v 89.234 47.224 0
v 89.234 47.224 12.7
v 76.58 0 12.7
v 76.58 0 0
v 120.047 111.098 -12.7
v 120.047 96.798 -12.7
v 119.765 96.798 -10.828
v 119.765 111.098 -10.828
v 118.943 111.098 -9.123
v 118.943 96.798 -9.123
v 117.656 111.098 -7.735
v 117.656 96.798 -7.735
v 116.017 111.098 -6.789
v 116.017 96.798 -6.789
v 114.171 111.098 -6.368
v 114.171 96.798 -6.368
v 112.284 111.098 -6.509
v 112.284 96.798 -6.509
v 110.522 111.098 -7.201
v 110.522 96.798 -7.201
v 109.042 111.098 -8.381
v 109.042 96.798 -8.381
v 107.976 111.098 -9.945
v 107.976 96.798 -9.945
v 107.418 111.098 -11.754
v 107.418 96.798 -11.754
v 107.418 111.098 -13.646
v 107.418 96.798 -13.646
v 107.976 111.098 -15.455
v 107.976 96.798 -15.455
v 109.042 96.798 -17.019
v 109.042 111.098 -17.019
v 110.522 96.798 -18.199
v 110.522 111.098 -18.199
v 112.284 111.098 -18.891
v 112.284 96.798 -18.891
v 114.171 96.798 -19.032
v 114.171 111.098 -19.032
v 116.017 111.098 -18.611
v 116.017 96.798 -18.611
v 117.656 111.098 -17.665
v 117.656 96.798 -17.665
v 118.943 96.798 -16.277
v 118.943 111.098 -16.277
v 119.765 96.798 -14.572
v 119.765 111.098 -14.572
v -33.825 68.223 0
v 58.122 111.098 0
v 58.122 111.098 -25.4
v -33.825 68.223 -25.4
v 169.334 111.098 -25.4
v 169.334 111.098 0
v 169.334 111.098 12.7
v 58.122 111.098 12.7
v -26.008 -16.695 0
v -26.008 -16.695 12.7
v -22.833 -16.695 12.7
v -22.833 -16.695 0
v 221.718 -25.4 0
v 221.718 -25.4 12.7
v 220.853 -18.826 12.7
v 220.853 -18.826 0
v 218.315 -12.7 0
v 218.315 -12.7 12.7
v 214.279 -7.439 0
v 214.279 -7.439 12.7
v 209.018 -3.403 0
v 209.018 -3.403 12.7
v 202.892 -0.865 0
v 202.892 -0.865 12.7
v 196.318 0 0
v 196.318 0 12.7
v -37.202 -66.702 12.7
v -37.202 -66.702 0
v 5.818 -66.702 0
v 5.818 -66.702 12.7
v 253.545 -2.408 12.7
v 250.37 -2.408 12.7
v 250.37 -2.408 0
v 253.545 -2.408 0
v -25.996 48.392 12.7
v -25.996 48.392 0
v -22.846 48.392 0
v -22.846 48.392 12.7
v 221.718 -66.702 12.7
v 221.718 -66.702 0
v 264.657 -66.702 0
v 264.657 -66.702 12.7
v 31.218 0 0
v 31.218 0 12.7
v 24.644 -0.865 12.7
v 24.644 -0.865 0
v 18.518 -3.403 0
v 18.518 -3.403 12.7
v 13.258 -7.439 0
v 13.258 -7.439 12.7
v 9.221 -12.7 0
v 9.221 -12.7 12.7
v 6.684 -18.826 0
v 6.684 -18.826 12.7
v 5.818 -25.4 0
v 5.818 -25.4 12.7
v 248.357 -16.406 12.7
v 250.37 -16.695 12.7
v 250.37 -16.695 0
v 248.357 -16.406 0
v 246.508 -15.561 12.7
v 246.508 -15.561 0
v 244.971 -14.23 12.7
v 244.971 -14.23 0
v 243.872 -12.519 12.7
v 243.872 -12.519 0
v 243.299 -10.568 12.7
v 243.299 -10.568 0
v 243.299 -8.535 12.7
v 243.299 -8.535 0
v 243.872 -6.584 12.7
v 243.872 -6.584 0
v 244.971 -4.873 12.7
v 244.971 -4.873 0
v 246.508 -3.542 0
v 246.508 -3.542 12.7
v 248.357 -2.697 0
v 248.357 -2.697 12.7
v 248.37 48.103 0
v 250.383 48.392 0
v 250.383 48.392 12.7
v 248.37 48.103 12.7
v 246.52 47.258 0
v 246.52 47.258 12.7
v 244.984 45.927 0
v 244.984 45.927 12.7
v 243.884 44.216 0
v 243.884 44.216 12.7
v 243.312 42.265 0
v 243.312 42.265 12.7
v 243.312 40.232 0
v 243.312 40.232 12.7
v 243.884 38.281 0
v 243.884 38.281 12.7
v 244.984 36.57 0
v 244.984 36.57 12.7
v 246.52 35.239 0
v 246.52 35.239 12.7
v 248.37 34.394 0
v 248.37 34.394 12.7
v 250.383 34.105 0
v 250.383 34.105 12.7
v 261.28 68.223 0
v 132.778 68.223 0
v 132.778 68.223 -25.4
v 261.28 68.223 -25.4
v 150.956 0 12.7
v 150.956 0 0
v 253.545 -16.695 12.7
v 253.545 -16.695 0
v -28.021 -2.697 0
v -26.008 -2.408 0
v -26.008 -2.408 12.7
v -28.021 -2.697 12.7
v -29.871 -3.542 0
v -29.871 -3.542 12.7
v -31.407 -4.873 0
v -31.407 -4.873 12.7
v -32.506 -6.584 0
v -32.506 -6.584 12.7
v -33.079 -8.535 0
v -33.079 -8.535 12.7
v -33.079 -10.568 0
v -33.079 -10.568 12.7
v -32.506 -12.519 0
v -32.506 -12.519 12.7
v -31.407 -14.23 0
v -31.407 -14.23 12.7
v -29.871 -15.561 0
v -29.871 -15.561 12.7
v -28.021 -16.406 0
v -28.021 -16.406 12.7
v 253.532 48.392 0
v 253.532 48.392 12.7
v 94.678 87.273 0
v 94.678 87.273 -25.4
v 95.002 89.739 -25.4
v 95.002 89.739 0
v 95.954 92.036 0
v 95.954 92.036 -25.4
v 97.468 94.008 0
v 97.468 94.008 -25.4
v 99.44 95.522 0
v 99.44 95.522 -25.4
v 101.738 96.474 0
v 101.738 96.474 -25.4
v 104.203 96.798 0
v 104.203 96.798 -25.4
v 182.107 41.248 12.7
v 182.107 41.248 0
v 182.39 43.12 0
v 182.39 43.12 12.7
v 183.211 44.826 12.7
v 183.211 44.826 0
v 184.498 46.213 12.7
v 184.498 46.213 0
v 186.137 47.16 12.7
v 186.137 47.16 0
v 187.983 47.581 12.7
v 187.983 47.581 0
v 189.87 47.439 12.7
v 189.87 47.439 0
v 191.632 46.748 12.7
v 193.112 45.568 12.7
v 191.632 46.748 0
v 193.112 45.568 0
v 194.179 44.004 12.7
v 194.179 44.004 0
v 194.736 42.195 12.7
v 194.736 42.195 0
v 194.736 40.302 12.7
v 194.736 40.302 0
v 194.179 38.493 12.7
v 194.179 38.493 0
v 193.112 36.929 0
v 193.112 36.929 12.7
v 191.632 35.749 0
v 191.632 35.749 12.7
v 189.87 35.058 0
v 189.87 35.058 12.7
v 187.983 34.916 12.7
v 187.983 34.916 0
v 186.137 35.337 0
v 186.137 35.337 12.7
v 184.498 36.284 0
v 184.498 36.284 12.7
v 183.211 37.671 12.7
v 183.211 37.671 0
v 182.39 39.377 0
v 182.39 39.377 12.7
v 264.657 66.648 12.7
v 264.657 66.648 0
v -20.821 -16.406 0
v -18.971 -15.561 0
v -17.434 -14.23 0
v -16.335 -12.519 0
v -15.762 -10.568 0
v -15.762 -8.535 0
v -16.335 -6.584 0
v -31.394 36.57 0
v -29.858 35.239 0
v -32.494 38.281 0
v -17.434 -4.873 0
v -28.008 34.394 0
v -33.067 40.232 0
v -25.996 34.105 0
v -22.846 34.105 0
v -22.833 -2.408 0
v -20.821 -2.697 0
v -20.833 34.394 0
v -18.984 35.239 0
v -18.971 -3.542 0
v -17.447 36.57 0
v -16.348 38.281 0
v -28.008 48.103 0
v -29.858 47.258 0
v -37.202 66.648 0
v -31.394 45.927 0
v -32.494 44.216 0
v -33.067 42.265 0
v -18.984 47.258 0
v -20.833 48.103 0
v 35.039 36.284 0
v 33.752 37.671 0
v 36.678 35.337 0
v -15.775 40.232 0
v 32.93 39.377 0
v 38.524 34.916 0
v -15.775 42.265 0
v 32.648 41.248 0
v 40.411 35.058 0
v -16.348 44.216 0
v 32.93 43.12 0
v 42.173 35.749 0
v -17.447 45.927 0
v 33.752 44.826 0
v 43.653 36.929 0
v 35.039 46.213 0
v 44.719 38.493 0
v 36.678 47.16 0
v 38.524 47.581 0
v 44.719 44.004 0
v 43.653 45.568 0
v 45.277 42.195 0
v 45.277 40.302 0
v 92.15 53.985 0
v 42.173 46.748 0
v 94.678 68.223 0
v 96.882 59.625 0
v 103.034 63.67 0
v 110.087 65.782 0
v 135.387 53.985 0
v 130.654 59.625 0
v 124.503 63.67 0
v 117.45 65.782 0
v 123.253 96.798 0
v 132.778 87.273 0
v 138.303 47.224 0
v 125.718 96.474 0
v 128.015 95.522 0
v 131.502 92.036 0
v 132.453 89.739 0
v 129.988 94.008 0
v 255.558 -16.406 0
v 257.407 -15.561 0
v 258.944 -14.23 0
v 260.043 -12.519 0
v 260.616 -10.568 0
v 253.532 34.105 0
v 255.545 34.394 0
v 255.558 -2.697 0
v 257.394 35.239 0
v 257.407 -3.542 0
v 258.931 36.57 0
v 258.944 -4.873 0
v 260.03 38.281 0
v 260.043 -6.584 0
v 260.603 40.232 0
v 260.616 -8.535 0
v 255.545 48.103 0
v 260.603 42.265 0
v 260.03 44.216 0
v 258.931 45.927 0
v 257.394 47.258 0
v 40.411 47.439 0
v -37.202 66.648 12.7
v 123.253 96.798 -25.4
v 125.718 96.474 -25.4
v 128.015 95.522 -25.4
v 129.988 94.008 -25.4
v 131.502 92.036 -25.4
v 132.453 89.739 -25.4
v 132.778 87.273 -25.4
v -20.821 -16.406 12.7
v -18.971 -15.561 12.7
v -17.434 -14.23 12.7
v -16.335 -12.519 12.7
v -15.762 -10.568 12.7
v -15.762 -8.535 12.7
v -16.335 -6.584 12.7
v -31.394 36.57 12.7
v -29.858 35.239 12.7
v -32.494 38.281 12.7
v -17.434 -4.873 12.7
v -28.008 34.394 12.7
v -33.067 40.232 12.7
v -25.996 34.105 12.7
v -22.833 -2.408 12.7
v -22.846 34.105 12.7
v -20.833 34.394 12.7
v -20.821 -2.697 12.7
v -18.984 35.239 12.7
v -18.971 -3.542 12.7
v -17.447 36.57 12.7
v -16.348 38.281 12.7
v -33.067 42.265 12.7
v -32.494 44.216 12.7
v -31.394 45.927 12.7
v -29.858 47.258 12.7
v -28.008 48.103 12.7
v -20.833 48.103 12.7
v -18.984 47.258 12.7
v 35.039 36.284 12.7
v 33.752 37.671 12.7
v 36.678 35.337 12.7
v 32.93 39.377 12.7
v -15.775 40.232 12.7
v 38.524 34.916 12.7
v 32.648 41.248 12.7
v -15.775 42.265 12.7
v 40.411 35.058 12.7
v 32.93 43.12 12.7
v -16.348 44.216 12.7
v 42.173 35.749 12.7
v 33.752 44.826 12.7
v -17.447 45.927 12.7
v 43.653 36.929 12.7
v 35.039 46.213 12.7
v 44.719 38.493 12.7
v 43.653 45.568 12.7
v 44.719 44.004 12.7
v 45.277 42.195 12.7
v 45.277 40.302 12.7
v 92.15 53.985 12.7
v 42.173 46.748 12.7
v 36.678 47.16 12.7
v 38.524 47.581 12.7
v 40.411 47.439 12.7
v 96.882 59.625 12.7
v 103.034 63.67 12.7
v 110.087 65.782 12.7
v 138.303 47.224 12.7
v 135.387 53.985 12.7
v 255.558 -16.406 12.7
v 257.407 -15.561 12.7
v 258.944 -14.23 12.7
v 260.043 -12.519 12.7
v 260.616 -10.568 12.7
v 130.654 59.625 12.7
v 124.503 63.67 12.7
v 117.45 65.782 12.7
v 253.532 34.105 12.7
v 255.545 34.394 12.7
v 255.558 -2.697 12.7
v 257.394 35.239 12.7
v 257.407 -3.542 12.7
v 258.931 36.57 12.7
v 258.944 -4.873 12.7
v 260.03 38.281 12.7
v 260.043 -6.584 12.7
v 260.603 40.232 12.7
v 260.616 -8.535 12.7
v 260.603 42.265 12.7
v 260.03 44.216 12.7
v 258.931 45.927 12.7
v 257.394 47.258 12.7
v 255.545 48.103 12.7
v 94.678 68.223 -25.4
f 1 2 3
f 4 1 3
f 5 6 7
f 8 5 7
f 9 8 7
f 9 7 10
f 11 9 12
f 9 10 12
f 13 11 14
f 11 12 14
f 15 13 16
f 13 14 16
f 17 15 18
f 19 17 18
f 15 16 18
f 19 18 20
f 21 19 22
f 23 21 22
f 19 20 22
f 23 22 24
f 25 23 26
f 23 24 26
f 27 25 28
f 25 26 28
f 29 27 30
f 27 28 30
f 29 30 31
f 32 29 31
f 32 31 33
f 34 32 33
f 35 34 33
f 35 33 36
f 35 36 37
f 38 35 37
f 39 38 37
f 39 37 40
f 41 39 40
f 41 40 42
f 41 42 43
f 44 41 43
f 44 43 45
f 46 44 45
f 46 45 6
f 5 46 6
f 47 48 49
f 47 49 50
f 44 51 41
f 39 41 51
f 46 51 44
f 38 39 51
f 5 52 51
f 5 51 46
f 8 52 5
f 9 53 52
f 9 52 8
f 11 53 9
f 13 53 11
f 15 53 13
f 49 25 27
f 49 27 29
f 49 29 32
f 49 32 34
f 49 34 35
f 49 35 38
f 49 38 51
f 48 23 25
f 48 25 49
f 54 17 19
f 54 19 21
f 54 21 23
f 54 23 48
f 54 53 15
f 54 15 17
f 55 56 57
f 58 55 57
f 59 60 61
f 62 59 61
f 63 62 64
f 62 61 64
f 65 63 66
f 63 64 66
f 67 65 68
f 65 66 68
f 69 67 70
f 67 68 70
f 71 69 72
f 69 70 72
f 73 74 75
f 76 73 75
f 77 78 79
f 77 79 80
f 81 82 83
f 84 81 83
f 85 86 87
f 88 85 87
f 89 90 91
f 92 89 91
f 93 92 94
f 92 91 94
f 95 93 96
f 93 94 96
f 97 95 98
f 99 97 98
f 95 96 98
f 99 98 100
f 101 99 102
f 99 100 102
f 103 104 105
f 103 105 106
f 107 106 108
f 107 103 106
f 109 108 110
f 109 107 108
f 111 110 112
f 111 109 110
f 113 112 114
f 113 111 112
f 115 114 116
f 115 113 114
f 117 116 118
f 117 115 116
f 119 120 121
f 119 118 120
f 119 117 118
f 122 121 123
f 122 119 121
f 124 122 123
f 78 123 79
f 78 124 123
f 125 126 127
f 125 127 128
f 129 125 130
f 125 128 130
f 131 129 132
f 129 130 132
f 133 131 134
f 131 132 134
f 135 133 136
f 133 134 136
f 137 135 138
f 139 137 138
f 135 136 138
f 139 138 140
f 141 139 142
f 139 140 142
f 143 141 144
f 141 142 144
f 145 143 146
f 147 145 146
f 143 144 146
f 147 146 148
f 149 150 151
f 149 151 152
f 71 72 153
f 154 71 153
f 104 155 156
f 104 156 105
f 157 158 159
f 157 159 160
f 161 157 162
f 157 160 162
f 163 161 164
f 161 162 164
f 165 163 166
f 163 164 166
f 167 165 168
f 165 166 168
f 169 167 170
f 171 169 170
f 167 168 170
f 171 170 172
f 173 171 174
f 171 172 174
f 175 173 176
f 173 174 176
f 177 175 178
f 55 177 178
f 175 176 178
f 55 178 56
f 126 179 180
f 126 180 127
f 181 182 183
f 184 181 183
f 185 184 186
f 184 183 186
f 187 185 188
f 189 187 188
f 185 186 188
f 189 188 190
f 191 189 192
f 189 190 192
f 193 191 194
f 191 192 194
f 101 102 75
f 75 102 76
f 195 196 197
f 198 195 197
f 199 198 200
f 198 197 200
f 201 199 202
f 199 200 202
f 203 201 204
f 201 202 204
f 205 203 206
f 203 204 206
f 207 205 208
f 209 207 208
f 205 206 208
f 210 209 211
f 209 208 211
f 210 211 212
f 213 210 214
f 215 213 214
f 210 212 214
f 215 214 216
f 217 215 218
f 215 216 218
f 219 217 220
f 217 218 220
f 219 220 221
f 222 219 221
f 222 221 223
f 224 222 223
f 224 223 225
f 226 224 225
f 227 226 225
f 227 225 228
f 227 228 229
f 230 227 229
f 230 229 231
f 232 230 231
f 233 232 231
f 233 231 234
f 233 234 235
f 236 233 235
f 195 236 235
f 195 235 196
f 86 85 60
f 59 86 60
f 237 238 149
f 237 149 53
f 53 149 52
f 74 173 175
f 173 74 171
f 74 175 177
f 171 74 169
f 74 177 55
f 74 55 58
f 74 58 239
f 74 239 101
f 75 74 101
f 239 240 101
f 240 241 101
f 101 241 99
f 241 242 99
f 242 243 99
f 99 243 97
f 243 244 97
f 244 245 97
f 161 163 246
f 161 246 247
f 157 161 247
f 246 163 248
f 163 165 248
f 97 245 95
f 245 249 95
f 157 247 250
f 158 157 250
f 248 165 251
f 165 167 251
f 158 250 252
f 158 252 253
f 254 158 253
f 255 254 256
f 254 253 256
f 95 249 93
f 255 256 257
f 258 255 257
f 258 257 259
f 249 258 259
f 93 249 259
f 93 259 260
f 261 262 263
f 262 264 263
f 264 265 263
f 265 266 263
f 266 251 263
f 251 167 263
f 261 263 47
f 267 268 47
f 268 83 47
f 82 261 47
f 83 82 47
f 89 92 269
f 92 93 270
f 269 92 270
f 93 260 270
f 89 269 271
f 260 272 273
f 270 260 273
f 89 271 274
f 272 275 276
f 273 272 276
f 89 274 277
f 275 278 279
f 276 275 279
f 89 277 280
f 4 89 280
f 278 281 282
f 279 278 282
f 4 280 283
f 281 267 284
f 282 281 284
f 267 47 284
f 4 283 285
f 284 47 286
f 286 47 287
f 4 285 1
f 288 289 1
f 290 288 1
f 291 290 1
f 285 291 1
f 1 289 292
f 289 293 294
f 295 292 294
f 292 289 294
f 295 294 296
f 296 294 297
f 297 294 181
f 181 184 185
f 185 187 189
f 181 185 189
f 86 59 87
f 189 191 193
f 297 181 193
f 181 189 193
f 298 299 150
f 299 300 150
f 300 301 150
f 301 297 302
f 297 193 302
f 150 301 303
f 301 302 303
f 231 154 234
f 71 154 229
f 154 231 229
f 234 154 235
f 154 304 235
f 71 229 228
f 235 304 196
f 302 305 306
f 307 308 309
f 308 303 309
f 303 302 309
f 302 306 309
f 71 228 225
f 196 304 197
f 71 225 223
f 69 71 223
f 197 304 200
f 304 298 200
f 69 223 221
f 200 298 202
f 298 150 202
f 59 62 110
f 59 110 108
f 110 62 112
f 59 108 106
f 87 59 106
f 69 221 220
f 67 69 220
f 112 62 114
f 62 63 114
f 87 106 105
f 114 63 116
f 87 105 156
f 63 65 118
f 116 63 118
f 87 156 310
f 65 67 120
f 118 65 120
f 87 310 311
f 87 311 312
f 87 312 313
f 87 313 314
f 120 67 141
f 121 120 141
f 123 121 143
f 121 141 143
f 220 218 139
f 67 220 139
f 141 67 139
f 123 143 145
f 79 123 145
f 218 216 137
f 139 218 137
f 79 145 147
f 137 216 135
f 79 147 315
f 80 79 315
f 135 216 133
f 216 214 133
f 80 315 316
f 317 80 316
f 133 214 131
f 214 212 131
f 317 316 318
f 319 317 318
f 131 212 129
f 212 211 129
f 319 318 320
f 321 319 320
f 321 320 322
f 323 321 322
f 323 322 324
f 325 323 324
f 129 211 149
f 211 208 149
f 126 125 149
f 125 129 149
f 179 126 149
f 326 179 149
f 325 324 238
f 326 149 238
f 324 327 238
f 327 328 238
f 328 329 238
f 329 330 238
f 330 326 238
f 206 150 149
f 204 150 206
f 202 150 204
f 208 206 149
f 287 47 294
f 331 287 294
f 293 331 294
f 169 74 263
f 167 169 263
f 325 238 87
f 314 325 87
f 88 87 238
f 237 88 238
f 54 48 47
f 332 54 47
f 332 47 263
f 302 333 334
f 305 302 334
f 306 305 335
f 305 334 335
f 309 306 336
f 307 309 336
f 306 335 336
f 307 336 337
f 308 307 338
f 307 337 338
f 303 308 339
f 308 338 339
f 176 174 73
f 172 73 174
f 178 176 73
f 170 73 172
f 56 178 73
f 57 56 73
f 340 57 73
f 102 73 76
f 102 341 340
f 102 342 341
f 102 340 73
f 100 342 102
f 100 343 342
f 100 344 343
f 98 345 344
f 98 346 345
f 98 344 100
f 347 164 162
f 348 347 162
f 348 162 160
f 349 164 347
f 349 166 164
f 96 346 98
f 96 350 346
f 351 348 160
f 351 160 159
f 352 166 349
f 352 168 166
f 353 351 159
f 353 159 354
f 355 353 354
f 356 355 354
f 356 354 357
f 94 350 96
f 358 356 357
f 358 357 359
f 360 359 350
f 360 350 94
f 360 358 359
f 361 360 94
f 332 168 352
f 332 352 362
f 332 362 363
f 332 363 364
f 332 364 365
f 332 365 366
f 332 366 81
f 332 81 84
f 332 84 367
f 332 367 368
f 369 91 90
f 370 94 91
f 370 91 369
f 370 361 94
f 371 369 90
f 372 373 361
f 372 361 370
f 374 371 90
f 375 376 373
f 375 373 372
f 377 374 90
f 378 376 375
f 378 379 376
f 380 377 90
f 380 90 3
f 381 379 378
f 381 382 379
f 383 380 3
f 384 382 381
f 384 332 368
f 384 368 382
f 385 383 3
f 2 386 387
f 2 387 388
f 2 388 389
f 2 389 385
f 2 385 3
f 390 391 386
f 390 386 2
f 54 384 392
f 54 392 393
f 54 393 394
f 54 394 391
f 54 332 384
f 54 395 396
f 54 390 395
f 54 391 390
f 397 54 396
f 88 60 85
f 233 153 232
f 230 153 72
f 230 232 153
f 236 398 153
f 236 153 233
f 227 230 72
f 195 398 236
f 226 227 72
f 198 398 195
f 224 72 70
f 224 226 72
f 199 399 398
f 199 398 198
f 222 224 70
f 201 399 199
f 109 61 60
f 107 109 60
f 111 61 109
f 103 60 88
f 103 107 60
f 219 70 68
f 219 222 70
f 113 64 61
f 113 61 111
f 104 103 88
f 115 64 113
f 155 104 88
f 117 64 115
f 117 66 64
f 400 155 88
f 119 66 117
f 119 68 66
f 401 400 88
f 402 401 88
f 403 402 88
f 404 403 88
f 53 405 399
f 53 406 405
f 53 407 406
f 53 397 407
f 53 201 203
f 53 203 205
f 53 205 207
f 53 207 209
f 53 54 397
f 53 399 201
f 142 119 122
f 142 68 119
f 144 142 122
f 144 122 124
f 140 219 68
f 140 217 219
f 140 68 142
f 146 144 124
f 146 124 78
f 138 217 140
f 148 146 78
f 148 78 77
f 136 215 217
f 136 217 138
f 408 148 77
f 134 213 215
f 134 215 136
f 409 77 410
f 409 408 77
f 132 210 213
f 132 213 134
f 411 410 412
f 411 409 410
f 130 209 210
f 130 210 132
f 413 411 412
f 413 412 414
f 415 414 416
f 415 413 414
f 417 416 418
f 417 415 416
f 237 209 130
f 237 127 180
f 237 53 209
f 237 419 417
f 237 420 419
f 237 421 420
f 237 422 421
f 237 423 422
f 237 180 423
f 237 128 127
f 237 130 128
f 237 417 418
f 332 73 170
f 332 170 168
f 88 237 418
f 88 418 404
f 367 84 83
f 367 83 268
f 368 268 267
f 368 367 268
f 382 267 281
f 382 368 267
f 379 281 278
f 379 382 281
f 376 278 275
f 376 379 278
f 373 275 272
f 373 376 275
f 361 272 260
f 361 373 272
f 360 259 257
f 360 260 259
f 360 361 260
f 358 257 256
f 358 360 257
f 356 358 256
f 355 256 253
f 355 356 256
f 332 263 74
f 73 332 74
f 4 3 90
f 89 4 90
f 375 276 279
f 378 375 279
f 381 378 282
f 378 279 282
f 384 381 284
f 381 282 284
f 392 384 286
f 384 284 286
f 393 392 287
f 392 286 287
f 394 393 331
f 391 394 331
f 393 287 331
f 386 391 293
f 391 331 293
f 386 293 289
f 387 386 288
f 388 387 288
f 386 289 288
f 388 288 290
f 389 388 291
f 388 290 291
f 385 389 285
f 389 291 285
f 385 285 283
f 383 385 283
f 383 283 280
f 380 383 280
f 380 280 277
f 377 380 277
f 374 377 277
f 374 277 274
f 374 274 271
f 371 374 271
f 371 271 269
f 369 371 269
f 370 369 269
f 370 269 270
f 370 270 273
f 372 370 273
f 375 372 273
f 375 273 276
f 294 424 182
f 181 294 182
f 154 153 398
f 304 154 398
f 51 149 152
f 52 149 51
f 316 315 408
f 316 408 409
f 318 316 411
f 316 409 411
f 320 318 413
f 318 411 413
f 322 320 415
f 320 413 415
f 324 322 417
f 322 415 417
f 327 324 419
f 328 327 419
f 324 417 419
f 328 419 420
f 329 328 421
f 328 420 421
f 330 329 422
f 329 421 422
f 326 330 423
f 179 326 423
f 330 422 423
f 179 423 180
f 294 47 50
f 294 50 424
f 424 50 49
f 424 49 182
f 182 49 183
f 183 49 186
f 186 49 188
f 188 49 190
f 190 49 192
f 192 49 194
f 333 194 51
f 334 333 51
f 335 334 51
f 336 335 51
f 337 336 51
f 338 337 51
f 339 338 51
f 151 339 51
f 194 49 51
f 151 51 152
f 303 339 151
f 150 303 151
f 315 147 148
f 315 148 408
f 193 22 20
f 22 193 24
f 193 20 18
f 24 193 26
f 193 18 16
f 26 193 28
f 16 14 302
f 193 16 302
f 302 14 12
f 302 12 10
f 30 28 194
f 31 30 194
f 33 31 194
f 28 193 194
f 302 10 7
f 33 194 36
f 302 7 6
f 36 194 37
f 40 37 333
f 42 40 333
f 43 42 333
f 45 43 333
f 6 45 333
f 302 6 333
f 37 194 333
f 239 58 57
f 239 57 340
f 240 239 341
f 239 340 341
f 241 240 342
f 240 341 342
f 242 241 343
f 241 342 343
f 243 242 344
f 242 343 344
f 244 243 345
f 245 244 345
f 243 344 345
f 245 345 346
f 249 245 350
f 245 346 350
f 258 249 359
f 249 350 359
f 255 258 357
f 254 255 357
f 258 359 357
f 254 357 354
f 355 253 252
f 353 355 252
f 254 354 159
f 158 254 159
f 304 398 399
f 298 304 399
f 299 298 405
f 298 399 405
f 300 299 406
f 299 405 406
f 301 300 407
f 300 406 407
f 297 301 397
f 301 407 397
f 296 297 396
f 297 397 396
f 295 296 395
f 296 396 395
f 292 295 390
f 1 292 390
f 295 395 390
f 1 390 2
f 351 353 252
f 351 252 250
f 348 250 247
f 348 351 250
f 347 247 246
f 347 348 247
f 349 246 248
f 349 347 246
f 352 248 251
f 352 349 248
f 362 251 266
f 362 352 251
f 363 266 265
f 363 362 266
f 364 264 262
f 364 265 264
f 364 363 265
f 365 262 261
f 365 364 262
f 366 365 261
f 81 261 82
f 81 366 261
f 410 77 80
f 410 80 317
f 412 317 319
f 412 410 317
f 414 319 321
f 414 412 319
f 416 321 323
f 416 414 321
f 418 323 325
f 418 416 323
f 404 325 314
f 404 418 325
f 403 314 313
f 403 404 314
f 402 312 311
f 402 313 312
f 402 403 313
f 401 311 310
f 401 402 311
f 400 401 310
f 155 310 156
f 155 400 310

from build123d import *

# Parameters (mm, degrees)
BASE_EXTRUDE_DEPTH             = 12.7
F_9_16_0_5625_DIAMETER_HOLE1_D = 14.2875
CUT_EXTRUDE1_REACH             = 14.7
BOSS_EXTRUDE1_DEPTH            = 25.4
F_1_2_20_TAPPED_HOLE1_D        = 12.7
CUT_EXTRUDE2_DEPTH             = 39.1
CUT_EXTRUDE3_DEPTH             = 39.1
F_1_2_20_TAPPED_HOLE2_D        = 12.7
CUT_EXTRUDE4_DEPTH             = 25.4


with BuildPart() as part:
    # Sketch1 → Base-Extrude (new body)
    with BuildSketch(Plane.XY):
        Polygon((58.12164787, 111.098459585), (-37.201684746, 66.648459585), (-37.201684746, -66.701540415), (264.657388756, -66.701540415), (264.657388756, 66.648459585), (169.334056139, 111.098459585), align=None)
    extrude(amount=BASE_EXTRUDE_DEPTH)

    # 9/16 (0.5625) Diameter Hole1 (through all)
    with Locations(Plane.XY.offset(12.7)):
        with Locations((251.957388756, -9.551540415), (251.957388756, 41.248459585)):
            f_9_16_0_5625_diameter_hole1 = Hole(F_9_16_0_5625_DIAMETER_HOLE1_D / 2)

    # Sketch8 → Cut-Extrude1 (cut, up to next)
    with BuildSketch(Plane.XY.offset(12.7), mode=Mode.PRIVATE) as cut_extrude1_sk1:
        with BuildLine():
            Line((5.818295254, -25.4), (5.818295254, -66.701540415))
            Line((5.818295254, -66.701540415), (221.718295254, -66.701540415))
            Line((221.718295254, -66.701540415), (221.718295254, -25.4))
            ThreePointArc((221.718295254, -25.4), (214.278807496, -7.439487758), (196.318295254, 0))
            Line((196.318295254, 0), (150.956476278, 0))
            Line((150.956476278, 0), (138.302811241, 47.224120819))
            ThreePointArc((138.302811241, 47.224120819), (113.768295254, 66.050117074), (89.233779266, 47.224120819))
            Line((89.233779266, 47.224120819), (76.580114229, 0))
            Line((76.580114229, 0), (31.218295254, 0))
            ThreePointArc((31.218295254, 0), (13.257783011, -7.439487758), (5.818295254, -25.4))
        make_face()
    cut_extrude1_tool1 = extrude(cut_extrude1_sk1.sketch, amount=-CUT_EXTRUDE1_REACH, mode=Mode.PRIVATE) & part.part
    add(cut_extrude1_tool1.solids().sort_by_distance((113.768295, -21.271265, 12.7))[0], mode=Mode.SUBTRACT)

    # Mirror3: 9/16 (0.5625) Diameter Hole1 across plane
    add(f_9_16_0_5625_diameter_hole1.mirror(Plane(origin=(113.768295254, 0, 0), x_dir=(0, 0, 1), z_dir=(1, 0, 0))), mode=Mode.SUBTRACT)

    # Sketch10 → Boss-Extrude1 (add)
    with BuildSketch(Plane(origin=(0, 0, 0), x_dir=(-1, 0, 0), z_dir=(0, 0, -1))):
        Polygon((-169.334056139, 111.098459585), (-58.12164787, 111.098459585), (33.824515248, 68.223259585), (-261.280219258, 68.223259585), align=None)
    extrude(amount=BOSS_EXTRUDE1_DEPTH)

    # 1/2-20 Tapped Hole1 (through all)
    with Locations(Plane(origin=(0, 111.098459585, 0), x_dir=(-1, 0, 0), z_dir=(0, 1, 0))):
        with Locations((-113.69684787, -12.7)):
            Hole(F_1_2_20_TAPPED_HOLE1_D / 2)

    # Sketch13 → Cut-Extrude2 (cut, through all)
    with BuildSketch(Plane.XY.offset(12.7)):
        with BuildLine():
            Line((250.369888756, -2.407790415), (253.544888756, -2.407790415))
            ThreePointArc((253.544888756, -2.407790415), (260.688638756, -9.551540415), (253.544888756, -16.695290415))
            Line((253.544888756, -16.695290415), (250.369888756, -16.695290415))
            ThreePointArc((250.369888756, -16.695290415), (243.226138756, -9.551540415), (250.369888756, -2.407790415))
        make_face()
    cut_extrude2 = extrude(amount=-CUT_EXTRUDE2_DEPTH, mode=Mode.SUBTRACT)

    # Sketch14 → Cut-Extrude3 (cut, through all)
    with BuildSketch(Plane.XY.offset(12.7)):
        with BuildLine():
            Line((253.532188756, 48.392209585), (250.382588756, 48.392209585))
            ThreePointArc((250.382588756, 48.392209585), (243.238838756, 41.248459585), (250.382588756, 34.104709585))
            Line((250.382588756, 34.104709585), (253.532188756, 34.104709585))
            ThreePointArc((253.532188756, 34.104709585), (260.675938756, 41.248459585), (253.532188756, 48.392209585))
        make_face()
    cut_extrude3 = extrude(amount=-CUT_EXTRUDE3_DEPTH, mode=Mode.SUBTRACT)

    # Mirror4: Cut-Extrude2, Cut-Extrude3 across plane
    add(cut_extrude2.mirror(Plane(origin=(113.768295254, 0, 0), x_dir=(0, 0, 1), z_dir=(1, 0, 0))), mode=Mode.SUBTRACT)
    add(cut_extrude3.mirror(Plane(origin=(113.768295254, 0, 0), x_dir=(0, 0, 1), z_dir=(1, 0, 0))), mode=Mode.SUBTRACT)

    # 1/2-20 Tapped Hole2 (through all)
    with Locations(Plane.XY.offset(12.7)):
        with Locations((38.998315254, 41.248459585), (188.457388756, 41.248459585)):
            Hole(F_1_2_20_TAPPED_HOLE2_D / 2)

    # Sketch17 → Cut-Extrude4 (cut)
    with BuildSketch(Plane(origin=(0, 0, -25.4), x_dir=(-1, 0, 0), z_dir=(0, 0, -1))):
        with BuildLine():
            Line((-132.777852005, 68.223259585), (-94.677852005, 68.223259585))
            Line((-94.677852005, 68.223259585), (-94.677852005, 87.273259585))
            ThreePointArc((-94.677852005, 87.273259585), (-97.467659914, 94.008451676), (-104.202852005, 96.798259585))
            Line((-104.202852005, 96.798259585), (-123.252852005, 96.798259585))
            ThreePointArc((-123.252852005, 96.798259585), (-129.988044096, 94.008451676), (-132.777852005, 87.273259585))
            Line((-132.777852005, 87.273259585), (-132.777852005, 68.223259585))
        make_face()
    extrude(amount=-CUT_EXTRUDE4_DEPTH, mode=Mode.SUBTRACT)


solid = part.part
